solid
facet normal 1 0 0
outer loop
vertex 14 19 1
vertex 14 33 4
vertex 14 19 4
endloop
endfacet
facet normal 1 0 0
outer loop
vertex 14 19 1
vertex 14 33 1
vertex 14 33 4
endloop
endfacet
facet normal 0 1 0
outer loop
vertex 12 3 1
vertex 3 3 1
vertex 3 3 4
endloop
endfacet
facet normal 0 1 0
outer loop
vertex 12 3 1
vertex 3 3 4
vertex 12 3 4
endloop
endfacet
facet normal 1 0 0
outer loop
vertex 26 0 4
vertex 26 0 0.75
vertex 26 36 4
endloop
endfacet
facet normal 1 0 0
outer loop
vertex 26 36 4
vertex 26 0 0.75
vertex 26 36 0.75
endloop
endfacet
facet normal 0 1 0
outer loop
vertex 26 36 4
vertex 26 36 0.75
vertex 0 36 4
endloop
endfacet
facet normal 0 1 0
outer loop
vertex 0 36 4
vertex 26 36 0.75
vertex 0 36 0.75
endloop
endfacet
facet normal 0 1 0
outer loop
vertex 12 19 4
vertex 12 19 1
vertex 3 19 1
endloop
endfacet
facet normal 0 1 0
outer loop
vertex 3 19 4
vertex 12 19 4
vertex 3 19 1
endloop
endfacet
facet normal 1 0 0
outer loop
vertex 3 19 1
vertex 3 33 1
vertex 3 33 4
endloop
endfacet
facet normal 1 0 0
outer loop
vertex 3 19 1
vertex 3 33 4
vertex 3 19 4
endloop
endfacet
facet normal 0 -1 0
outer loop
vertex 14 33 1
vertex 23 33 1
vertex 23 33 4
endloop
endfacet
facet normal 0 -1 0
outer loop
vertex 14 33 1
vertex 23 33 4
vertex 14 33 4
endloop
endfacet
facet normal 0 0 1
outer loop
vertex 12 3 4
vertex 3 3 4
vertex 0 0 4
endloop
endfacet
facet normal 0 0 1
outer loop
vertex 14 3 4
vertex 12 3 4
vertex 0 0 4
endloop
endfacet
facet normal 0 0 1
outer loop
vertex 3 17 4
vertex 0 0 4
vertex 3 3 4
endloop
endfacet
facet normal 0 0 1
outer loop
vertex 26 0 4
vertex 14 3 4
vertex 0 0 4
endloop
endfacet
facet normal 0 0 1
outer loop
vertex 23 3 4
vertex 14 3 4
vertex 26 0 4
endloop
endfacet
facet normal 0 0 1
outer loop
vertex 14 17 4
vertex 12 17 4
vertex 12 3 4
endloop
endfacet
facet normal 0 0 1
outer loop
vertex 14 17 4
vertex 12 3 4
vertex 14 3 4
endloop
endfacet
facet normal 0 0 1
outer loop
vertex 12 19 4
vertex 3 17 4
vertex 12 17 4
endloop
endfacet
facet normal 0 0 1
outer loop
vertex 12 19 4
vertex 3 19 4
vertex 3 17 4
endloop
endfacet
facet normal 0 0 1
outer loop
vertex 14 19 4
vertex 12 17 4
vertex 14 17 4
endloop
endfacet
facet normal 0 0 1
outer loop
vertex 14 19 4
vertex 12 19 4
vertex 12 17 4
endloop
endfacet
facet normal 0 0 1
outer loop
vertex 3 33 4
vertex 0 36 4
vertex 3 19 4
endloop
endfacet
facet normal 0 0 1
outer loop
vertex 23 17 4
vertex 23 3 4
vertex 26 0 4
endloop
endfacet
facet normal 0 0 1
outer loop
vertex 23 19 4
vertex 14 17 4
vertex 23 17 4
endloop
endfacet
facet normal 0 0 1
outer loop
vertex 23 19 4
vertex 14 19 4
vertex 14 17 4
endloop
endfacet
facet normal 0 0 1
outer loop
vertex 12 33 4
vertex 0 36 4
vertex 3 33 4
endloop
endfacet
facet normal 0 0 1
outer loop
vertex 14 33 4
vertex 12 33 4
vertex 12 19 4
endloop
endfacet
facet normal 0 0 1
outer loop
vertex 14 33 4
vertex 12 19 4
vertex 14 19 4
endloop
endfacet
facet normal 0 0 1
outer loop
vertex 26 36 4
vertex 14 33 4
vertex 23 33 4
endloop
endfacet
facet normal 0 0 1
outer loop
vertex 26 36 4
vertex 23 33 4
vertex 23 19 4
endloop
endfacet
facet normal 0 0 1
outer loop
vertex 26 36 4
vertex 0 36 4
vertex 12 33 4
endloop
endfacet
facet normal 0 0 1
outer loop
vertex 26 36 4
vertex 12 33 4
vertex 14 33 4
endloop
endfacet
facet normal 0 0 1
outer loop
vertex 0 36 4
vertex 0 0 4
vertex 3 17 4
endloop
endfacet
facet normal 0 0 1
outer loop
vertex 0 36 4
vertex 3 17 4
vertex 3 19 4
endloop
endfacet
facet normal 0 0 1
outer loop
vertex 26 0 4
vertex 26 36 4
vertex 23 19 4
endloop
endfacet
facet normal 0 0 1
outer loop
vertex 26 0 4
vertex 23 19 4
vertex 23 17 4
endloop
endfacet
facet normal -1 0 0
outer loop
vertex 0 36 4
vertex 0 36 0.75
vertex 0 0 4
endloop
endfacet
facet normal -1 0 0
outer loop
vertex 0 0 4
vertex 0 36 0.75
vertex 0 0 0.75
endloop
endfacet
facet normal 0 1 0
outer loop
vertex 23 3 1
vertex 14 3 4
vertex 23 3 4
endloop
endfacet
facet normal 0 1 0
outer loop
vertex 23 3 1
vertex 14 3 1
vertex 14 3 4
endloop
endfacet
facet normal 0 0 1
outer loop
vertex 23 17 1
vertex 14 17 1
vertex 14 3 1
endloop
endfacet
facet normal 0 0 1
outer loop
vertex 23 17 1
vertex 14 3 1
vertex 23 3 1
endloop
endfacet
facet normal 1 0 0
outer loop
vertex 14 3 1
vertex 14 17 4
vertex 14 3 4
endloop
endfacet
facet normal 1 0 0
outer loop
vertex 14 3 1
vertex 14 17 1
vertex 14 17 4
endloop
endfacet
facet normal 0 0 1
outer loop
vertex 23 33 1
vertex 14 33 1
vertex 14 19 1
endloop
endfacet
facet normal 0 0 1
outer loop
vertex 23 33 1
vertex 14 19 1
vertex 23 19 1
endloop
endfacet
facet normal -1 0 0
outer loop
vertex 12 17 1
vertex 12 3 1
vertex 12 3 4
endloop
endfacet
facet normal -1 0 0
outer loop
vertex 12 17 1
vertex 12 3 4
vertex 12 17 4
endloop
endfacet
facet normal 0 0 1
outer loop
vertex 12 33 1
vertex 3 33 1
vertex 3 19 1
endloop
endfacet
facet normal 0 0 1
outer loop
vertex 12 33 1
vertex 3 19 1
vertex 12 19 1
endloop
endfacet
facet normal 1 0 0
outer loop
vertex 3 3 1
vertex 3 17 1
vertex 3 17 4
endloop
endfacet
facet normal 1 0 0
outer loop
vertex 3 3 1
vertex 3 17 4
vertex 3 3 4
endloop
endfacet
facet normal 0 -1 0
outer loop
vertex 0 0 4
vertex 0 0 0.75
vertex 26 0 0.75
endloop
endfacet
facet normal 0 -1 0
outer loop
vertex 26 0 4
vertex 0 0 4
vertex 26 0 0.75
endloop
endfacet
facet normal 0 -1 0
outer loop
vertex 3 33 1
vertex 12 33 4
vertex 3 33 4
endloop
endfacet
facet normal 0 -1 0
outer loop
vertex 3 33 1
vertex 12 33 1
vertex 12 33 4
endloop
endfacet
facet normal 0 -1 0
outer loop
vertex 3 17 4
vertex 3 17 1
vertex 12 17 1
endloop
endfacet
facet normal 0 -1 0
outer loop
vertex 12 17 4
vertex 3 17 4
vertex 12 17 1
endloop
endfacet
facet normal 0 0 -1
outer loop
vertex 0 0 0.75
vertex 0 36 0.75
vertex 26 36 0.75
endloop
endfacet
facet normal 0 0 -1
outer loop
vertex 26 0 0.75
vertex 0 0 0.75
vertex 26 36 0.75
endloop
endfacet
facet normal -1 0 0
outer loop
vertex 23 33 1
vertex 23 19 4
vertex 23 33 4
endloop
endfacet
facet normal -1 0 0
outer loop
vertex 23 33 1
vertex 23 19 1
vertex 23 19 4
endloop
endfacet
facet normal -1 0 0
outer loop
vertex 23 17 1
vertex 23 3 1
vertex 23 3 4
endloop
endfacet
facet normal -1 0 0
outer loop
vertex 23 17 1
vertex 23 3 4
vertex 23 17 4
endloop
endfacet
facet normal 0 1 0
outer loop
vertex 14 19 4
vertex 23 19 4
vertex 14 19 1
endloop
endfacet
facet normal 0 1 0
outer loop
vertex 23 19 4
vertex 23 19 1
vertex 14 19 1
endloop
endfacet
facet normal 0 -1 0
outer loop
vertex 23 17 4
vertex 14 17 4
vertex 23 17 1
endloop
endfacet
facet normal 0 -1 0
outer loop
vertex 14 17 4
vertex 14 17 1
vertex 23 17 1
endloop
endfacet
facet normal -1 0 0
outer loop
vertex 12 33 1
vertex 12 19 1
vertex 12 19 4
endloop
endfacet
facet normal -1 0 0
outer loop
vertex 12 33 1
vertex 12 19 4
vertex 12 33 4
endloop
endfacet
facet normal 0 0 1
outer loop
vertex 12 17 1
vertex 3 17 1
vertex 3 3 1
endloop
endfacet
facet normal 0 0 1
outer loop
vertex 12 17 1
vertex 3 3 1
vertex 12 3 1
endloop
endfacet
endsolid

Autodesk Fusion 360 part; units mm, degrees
sketch "Sketch1" plane through (0, 0, 0) normal (0, 0, 1) x (1, 0, 0)
  line L0 (0, 0) -> (26, 0)
  line L1 (26, 0) -> (26, 36)
  line L2 (26, 36) -> (0, 36)
  line L3 (0, 36) -> (0, 0)
  line L4 (3, 3) -> (23, 3)
  line L5 (3, 33) -> (3, 3)
  line L6 (23, 3) -> (23, 33)
  line L7 (23, 33) -> (3, 33)
  dimension "d2" = 30
sketch "Sketch3" plane through (0, 0, 0) normal (0, 0, 1) x (1, 0, 0)
  line L0 (12, 33) -> (14, 33)
  line L1 (14, 33) -> (14, 3)
  line L2 (14, 3) -> (12, 3)
  line L3 (12, 3) -> (12, 33)
  line L4 (23, 19) -> (3, 19)
  line L5 (3, 19) -> (3, 17)
  line L6 (3, 17) -> (23, 17)
  line L7 (23, 17) -> (23, 19)
extrude "Extrude1" add sketch "Sketch1" along normal blind 4
extrude "Extrude5" add sketch "Sketch3" along normal blind 4 contours L0 L1 L3 L4 | L1 L3 L4 L6 | L1 L2 L3 L6
extrude "Extrude6" add sketch "Sketch3" along normal blind 4 contours L3 L4 L5 L6
extrude "Extrude7" add sketch "Sketch3" along normal blind 4 contours L1 L4 L6 L7
sketch "Sketch5" plane through (0, 0, 0) normal (0, 0, 1) x (1, 0, 0)
  line L0 (26, 36) -> (0, 36)
  line L1 (0, 0) -> (26, 0)
  line L2 (0, 36) -> (0, 0)
  line L3 (26, 0) -> (26, 36)
extrude "Extrude9" add sketch "Sketch5" along normal blind 1
move_face "OffsetFaces1" offset -0.75 1 faces at (8.6667, 24, 0)
extrude "Extrude8" [suppressed]
extrude "Extrude4" [suppressed]
extrude "Extrude3" [suppressed]
extrude "Extrude2" [suppressed]
